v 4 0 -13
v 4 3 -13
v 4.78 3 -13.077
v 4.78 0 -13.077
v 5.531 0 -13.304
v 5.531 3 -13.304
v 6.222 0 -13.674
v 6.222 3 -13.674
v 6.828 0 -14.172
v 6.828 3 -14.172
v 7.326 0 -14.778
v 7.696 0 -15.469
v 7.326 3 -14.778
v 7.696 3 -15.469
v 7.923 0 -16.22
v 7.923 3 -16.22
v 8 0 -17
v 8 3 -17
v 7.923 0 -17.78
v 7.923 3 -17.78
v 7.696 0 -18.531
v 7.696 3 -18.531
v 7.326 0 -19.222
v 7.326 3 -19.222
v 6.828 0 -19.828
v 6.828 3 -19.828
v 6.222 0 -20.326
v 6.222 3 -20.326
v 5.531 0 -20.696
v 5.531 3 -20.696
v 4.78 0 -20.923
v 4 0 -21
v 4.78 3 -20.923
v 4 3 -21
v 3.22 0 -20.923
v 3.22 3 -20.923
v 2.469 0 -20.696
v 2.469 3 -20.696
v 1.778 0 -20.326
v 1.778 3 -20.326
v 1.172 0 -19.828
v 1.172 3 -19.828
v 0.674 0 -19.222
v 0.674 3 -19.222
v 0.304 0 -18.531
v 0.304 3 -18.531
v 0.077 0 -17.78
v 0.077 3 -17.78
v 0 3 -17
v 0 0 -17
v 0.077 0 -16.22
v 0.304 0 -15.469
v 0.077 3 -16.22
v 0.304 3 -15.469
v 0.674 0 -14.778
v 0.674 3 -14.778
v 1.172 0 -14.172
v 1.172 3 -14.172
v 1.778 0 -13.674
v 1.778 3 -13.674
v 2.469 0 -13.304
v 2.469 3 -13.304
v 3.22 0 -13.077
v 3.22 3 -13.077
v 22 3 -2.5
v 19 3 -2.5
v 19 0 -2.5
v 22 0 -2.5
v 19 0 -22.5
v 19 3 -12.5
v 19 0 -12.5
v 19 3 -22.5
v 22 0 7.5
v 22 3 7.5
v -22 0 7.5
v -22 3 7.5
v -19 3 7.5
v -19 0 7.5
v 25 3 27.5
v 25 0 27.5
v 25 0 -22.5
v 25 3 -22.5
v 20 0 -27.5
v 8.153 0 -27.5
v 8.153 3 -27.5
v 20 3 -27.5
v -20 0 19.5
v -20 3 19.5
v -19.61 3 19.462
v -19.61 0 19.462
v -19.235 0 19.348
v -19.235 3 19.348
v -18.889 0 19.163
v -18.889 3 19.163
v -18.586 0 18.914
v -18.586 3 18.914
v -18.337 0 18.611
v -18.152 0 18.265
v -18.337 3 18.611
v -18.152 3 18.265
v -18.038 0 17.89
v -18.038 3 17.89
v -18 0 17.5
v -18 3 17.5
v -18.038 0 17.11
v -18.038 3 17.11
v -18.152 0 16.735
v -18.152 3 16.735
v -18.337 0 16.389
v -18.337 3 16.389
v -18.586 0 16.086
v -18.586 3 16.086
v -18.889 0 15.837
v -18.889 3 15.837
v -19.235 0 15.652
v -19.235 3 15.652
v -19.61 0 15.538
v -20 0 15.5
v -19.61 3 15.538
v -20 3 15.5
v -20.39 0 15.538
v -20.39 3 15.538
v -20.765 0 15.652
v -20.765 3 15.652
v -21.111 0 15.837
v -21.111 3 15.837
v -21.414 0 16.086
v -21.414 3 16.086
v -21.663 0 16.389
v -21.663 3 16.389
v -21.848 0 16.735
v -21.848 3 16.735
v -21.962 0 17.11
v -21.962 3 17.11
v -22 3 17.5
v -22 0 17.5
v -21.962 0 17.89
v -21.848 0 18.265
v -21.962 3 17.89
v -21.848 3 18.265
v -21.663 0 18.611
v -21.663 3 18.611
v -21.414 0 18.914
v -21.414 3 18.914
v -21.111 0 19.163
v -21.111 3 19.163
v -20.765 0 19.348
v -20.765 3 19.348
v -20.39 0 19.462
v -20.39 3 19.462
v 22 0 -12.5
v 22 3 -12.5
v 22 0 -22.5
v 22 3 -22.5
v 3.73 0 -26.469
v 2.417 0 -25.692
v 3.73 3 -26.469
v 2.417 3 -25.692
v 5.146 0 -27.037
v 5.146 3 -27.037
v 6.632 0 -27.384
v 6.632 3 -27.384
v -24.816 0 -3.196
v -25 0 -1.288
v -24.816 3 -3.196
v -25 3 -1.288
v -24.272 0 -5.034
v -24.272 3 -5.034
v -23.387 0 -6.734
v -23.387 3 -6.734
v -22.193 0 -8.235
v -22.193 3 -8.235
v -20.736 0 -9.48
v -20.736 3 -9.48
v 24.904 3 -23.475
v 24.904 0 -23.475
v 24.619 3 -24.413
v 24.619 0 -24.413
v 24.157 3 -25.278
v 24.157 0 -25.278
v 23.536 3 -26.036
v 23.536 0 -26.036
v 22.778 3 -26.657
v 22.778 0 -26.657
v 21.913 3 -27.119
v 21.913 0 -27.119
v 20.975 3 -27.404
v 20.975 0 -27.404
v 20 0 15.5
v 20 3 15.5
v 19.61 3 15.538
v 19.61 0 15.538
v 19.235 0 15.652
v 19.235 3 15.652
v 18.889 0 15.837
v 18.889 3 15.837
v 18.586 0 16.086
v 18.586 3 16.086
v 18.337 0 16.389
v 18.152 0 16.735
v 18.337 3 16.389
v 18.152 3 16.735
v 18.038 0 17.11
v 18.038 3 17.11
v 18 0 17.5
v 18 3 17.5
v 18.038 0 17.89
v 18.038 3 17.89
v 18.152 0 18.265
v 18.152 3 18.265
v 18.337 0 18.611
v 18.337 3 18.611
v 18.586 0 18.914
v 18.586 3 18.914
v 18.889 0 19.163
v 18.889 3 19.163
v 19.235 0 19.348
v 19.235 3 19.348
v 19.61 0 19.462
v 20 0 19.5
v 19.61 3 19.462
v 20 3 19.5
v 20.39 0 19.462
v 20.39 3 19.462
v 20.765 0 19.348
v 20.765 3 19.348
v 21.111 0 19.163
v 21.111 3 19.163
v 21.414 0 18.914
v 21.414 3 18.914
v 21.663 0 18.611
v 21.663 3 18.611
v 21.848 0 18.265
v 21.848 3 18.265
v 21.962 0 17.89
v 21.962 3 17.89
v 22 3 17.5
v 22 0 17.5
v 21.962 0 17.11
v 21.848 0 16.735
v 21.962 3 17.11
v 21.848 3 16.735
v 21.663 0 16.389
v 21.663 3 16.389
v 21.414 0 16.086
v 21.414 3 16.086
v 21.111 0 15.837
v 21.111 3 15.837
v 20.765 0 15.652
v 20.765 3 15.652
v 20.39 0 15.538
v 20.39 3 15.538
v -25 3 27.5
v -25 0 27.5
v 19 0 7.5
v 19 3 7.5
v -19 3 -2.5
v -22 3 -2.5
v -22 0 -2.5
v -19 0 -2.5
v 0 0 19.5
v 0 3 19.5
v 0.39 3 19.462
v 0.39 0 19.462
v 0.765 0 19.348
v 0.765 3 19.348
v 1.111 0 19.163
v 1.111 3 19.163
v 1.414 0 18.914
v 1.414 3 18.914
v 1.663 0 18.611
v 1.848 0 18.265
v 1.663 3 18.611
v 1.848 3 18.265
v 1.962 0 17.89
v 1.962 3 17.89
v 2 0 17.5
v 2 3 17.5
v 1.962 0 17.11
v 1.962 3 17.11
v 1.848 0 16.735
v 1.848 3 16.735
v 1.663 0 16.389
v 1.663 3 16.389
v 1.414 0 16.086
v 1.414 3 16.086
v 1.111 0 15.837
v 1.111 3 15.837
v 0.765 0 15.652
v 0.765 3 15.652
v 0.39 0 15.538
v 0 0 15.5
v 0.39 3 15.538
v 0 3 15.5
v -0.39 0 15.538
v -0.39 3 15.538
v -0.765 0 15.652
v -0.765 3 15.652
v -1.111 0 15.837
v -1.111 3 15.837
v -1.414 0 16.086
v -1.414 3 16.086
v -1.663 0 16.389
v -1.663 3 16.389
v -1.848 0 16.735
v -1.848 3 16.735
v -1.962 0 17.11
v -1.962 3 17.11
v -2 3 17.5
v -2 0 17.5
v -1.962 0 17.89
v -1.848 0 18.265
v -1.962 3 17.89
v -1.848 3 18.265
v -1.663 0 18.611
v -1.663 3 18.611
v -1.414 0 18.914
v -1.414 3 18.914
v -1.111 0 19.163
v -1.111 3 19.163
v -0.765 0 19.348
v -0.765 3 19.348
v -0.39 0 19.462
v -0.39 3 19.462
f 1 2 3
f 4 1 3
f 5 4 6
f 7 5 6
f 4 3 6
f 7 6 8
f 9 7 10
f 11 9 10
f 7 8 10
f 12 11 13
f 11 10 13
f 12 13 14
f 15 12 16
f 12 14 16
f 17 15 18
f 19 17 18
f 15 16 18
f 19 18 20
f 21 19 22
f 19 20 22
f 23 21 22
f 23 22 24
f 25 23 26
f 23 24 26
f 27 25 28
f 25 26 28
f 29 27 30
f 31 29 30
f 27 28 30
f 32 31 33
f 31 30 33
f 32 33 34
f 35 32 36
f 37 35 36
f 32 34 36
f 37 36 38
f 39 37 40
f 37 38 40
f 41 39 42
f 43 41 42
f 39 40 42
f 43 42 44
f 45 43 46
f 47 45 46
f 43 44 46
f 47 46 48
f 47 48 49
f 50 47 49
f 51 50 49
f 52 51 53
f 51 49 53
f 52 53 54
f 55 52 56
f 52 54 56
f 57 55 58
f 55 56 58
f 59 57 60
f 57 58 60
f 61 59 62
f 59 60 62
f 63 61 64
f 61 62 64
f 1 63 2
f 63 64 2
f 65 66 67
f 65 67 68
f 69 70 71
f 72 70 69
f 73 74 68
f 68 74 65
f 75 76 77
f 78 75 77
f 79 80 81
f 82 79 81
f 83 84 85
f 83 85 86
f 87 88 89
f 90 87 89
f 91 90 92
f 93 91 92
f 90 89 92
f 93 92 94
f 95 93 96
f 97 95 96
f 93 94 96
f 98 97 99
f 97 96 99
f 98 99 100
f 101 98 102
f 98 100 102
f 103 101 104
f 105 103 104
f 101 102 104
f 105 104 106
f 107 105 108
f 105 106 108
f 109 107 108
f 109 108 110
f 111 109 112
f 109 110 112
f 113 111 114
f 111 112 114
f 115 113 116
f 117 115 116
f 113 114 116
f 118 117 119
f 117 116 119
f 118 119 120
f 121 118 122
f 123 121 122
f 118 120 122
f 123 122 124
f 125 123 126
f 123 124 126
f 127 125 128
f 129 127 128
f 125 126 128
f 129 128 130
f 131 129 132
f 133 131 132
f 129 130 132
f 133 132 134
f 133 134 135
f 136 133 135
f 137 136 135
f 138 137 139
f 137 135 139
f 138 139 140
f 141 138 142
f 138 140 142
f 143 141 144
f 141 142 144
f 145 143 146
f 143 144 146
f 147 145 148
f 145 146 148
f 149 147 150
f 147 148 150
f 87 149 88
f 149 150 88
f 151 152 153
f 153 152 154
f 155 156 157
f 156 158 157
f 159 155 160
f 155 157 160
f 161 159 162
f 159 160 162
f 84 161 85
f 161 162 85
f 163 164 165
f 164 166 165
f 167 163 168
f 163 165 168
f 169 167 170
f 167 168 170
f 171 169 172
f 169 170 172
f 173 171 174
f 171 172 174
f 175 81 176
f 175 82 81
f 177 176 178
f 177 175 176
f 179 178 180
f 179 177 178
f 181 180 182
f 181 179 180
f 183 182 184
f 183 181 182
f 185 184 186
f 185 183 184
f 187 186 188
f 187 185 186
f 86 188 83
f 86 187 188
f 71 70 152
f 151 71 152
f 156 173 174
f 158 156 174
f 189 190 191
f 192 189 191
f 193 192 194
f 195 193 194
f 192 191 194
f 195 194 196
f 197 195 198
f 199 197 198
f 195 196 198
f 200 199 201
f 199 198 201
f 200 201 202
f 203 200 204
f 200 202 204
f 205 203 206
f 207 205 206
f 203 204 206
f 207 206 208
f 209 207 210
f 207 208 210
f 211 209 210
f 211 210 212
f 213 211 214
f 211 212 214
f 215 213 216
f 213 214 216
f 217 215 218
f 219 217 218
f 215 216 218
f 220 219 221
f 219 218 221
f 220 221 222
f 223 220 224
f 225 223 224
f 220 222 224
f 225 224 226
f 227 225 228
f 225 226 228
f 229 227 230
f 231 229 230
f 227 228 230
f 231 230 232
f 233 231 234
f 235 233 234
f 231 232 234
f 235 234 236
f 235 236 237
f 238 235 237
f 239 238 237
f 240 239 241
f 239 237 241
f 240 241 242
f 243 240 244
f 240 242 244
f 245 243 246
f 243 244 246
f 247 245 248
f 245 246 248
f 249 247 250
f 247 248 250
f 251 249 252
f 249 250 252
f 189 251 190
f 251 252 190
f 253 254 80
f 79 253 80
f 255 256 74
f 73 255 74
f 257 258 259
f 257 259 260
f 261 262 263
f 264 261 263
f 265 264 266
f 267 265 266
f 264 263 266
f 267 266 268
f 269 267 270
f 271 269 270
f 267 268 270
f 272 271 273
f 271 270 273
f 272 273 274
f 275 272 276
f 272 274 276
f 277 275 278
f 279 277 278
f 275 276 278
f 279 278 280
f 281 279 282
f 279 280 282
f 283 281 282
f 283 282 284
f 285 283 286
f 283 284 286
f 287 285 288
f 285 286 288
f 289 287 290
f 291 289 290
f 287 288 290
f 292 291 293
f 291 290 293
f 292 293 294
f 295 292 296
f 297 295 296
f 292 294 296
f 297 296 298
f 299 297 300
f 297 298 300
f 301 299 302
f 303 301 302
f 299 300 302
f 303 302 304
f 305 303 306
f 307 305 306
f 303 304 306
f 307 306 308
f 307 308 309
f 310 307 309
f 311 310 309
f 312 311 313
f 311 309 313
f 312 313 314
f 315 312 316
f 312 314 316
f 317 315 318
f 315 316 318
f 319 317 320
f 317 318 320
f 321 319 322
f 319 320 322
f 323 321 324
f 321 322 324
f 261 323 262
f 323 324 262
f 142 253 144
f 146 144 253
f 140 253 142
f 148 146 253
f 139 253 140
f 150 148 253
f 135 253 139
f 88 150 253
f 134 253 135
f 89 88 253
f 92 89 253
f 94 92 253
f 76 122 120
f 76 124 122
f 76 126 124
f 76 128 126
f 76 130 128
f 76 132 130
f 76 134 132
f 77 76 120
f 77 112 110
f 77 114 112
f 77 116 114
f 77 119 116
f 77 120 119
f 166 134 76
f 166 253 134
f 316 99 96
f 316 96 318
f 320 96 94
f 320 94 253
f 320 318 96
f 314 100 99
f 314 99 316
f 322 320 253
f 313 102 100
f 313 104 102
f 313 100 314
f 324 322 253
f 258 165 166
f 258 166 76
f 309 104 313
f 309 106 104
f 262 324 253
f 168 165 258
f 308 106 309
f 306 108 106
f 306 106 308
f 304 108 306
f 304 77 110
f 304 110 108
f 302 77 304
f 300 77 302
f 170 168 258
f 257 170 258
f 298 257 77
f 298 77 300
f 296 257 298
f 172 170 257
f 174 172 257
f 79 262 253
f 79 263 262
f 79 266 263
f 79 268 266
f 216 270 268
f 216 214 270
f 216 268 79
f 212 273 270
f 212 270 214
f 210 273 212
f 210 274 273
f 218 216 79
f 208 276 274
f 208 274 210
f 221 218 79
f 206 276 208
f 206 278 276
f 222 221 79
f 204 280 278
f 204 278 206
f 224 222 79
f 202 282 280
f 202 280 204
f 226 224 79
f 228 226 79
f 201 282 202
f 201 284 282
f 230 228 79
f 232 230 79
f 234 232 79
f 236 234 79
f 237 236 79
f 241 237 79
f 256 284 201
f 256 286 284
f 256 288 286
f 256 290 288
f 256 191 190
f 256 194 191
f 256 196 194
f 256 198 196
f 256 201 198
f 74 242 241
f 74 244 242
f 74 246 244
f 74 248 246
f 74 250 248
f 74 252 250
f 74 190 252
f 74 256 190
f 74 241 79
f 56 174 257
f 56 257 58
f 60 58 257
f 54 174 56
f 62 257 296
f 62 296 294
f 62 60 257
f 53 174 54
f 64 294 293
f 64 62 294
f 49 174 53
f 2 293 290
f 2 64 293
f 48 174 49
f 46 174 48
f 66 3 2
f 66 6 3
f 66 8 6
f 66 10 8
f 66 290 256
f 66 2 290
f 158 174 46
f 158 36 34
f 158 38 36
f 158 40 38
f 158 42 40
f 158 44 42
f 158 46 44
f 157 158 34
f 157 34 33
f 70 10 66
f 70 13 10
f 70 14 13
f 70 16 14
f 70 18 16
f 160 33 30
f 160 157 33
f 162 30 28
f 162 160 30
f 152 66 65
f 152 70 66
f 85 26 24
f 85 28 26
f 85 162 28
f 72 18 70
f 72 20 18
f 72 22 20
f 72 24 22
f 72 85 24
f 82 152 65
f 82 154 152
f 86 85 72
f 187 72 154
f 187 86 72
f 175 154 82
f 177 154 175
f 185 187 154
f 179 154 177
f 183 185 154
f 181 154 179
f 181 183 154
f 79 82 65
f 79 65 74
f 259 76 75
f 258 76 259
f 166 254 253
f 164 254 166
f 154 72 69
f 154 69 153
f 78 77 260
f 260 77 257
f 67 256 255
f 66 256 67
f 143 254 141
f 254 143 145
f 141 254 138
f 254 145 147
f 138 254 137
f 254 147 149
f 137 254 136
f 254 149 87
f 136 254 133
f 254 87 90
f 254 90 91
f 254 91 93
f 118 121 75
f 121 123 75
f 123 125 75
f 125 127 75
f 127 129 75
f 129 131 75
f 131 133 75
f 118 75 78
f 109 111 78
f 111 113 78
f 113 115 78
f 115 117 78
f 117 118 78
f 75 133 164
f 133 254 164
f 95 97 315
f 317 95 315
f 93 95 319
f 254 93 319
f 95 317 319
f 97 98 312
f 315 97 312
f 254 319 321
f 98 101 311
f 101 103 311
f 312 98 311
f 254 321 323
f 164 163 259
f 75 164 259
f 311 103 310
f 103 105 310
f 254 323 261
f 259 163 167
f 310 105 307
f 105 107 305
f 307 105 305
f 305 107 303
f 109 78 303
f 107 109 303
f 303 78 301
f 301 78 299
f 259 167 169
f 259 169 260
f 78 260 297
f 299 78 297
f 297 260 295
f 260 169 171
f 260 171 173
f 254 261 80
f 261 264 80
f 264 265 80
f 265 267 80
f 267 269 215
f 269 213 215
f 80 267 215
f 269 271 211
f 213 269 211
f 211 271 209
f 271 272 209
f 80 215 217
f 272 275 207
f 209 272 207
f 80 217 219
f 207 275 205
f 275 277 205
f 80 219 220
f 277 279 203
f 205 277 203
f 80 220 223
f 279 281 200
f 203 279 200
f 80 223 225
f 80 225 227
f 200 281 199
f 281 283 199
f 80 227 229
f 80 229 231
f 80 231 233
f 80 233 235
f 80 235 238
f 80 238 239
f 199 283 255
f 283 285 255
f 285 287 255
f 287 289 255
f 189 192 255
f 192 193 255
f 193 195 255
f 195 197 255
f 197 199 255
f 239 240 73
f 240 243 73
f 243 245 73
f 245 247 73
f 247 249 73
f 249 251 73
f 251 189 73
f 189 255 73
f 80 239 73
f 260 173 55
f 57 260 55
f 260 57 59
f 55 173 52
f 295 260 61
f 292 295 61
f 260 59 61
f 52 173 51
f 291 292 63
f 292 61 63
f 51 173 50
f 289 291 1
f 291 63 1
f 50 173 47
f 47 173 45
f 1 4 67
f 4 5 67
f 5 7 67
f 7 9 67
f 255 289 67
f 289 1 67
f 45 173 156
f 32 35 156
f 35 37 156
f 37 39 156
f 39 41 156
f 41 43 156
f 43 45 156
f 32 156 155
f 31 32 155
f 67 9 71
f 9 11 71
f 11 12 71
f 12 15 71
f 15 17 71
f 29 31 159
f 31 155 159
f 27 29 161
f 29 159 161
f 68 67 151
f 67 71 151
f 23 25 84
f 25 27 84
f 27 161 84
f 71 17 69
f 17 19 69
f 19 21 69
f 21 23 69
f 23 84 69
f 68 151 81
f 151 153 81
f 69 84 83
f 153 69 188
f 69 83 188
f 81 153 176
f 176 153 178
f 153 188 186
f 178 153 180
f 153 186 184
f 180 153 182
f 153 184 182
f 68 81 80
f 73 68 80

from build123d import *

# Parameters (mm, degrees)
SKETCH_1_W          = 50
SKETCH_1_H          = 55
EXTRUDE_1_DEPTH     = 3
SKETCH_2_R          = 4
CUT_EXTRUDE_1_DEPTH = 3
SKETCH_3_R          = 2
CUT_EXTRUDE_2_DEPTH = 3
SKETCH_4_W          = 3
SKETCH_4_H          = 10
CUT_EXTRUDE_3_DEPTH = 3
CHAMFER_1_SIZE      = 30
CHAMFER_1_SIZE2     = 21.006226146
FILLET_2_R          = 10
FILLET_3_R          = 5


with BuildPart() as part:
    # 草图1 → 凸台-拉伸1 (new body)
    with BuildSketch(Plane(origin=(0, 0, 0), x_dir=(1, 0, 0), z_dir=(0, 1, 0))):
        Rectangle(SKETCH_1_W, SKETCH_1_H)
    extrude(amount=EXTRUDE_1_DEPTH)

    # 草图2 → 切除-拉伸1 (cut)
    with BuildSketch(Plane(origin=(0, 3, 0), x_dir=(1, 0, 0), z_dir=(0, 1, 0))):
        with Locations(Location((4, 17, 0), (0, 0, 270))):
            Circle(SKETCH_2_R)
    extrude(amount=-CUT_EXTRUDE_1_DEPTH, mode=Mode.SUBTRACT)

    # 草图3 → 切除-拉伸2 (cut)
    with BuildSketch(Plane(origin=(0, 3, 0), x_dir=(1, 0, 0), z_dir=(0, 1, 0))):
        with Locations(Location((-20, -17.5, 0), (0, 0, 270))):
            Circle(SKETCH_3_R)
        with Locations(Location((0, -17.5, 0), (0, 0, 270))):
            Circle(SKETCH_3_R)
        with Locations(Location((20, -17.5, 0), (0, 0, 90))):
            Circle(SKETCH_3_R)
    extrude(amount=-CUT_EXTRUDE_2_DEPTH, mode=Mode.SUBTRACT)

    # 草图4 → 切除-拉伸3 (cut)
    with BuildSketch(Plane(origin=(0, 3, 0), x_dir=(1, 0, 0), z_dir=(0, 1, 0))):
        with Locations((-20.5, -2.5)):
            Rectangle(SKETCH_4_W, SKETCH_4_H)
        with Locations((20.5, -2.5)):
            Rectangle(SKETCH_4_W, SKETCH_4_H)
        with Locations((20.5, 17.5)):
            Rectangle(SKETCH_4_W, SKETCH_4_H)
    extrude(amount=-CUT_EXTRUDE_3_DEPTH, mode=Mode.SUBTRACT)

    # 倒角1
    chamfer_1_edges = [part.edges().sort_by_distance(p)[0] for p in [
        (-25, 1.5, -27.5),
    ]]
    chamfer_1_side = [part.faces().sort_by_distance(p)[0] for p in [
        (0, 1.5, -27.5),
    ]]
    chamfer(chamfer_1_edges, length=CHAMFER_1_SIZE, length2=CHAMFER_1_SIZE2, reference=chamfer_1_side[0])

    # 圆角2
    fillet_2_edges = [part.edges().sort_by_distance(p)[0] for p in [
        (-25, 1.5, -6.493773854),
        (5, 1.5, -27.5),
    ]]
    fillet(fillet_2_edges, radius=FILLET_2_R)

    # 圆角3
    fillet_3_edges = [part.edges().sort_by_distance(p)[0] for p in [
        (25, 1.5, -27.5),
    ]]
    fillet(fillet_3_edges, radius=FILLET_3_R)


solid = part.part
